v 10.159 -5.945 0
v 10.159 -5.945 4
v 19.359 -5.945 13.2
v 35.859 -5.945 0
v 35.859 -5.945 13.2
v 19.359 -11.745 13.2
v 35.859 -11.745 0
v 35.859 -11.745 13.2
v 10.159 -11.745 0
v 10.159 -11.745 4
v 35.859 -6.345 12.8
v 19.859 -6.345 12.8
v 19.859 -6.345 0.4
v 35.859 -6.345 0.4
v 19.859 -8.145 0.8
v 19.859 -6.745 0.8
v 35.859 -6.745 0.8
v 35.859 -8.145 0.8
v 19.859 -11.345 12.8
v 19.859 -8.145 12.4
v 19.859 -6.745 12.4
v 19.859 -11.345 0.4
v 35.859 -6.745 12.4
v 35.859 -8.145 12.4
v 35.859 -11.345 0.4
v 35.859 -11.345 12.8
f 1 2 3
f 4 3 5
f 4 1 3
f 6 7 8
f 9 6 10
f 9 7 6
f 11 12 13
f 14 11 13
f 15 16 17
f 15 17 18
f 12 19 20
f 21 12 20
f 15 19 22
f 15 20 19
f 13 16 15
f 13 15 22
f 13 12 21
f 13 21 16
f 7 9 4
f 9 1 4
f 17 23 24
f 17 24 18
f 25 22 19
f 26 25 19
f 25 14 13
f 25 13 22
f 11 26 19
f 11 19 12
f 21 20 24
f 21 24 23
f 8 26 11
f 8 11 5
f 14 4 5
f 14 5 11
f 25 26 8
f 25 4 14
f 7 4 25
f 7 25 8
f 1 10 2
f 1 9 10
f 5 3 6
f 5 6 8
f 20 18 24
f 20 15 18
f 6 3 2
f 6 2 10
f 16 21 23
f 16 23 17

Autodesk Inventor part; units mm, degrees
ref_plane "YZ Plane" through (0, 0, 0) normal (1, 0, 0) x (0, 1, 0)
ref_plane "XZ Plane" through (0, 0, 0) normal (0, 1, 0) x (-1, 0, 0)
ref_plane "XY Plane" through (0, 0, 0) normal (0, 0, 1) x (1, 0, 0)
ref_plane "Work Plane1" through (0, 0, 0) normal (0, 0, 1) x (1, 0, 0)
sketch "Sketch1" plane through (0, 0, 0) normal (0, 0, 1) x (1, 0, 0)
  line L0 (10.1591, -5.9453) -> (35.8591, -5.9453)
  line L1 (35.8591, -5.9453) -> (35.8591, -11.7453)
  line L2 (35.8591, -11.7453) -> (10.1591, -11.7453)
  line L3 (10.1591, -11.7453) -> (10.1591, -5.9453)
  point P0 (0, 0)
  dimension "d0" = 25.7
  dimension "d2" = 5.8
extrude "Extrusion1" add sketch "Sketch1" along normal blind 13.2
chamfer "Chamfer1" distance 9.2 angle 45 1 edges at (10.1591, -8.8453, 13.2)
sketch "Sketch2" plane through (35.8591, -11.7453, 0) normal (1, 0, 0) x (0, 0, -1)
  line L0 (0, 5.8) -> (0, 0) projected
  line L1 (0, 5.8) -> (-13.2, 5.8) projected
  line L2 (-13.2, 0) -> (-13.2, 5.8) projected
  line L3 (0, 0) -> (-13.2, 0) projected
  line L4 (-12.8, 5.4) -> (-0.4, 5.4)
  line L5 (-0.4, 5.4) -> (-0.4, 0.4)
  line L6 (-0.4, 0.4) -> (-12.8, 0.4)
  line L7 (-12.8, 0.4) -> (-12.8, 5.4)
  point P0 (0, 11.7453)
  dimension "d8" = 0.4
extrude "Extrusion2" cut sketch "Sketch2" against normal blind 16 contours L4 L5 L6 L7
sketch "Sketch3" plane through (19.8591, -11.7453, 0) normal (1, 0, 0) x (0, 0, -1)
  line L0 (-12.8, 5.4) -> (-0.4, 5.4) projected
  line L1 (-12.8, 0.4) -> (-12.8, 5.4) projected
  line L2 (-0.4, 5.4) -> (-0.4, 0.4) projected
  line L3 (-12.4, 5) -> (-0.8, 5)
  line L4 (-0.8, 5) -> (-0.8, 3.6)
  line L5 (-0.8, 3.6) -> (-12.4, 3.6)
  line L6 (-12.4, 3.6) -> (-12.4, 5)
  point P0 (0, 11.7453)
  dimension "d11" = 0.4
  dimension "d12" = 0.4
  dimension "d13" = 0.4
  dimension "d14" = 1.4
extrude "Extrusion3" add sketch "Sketch3" along normal blind 16
properties part number "nanopc_t4_usb3"
